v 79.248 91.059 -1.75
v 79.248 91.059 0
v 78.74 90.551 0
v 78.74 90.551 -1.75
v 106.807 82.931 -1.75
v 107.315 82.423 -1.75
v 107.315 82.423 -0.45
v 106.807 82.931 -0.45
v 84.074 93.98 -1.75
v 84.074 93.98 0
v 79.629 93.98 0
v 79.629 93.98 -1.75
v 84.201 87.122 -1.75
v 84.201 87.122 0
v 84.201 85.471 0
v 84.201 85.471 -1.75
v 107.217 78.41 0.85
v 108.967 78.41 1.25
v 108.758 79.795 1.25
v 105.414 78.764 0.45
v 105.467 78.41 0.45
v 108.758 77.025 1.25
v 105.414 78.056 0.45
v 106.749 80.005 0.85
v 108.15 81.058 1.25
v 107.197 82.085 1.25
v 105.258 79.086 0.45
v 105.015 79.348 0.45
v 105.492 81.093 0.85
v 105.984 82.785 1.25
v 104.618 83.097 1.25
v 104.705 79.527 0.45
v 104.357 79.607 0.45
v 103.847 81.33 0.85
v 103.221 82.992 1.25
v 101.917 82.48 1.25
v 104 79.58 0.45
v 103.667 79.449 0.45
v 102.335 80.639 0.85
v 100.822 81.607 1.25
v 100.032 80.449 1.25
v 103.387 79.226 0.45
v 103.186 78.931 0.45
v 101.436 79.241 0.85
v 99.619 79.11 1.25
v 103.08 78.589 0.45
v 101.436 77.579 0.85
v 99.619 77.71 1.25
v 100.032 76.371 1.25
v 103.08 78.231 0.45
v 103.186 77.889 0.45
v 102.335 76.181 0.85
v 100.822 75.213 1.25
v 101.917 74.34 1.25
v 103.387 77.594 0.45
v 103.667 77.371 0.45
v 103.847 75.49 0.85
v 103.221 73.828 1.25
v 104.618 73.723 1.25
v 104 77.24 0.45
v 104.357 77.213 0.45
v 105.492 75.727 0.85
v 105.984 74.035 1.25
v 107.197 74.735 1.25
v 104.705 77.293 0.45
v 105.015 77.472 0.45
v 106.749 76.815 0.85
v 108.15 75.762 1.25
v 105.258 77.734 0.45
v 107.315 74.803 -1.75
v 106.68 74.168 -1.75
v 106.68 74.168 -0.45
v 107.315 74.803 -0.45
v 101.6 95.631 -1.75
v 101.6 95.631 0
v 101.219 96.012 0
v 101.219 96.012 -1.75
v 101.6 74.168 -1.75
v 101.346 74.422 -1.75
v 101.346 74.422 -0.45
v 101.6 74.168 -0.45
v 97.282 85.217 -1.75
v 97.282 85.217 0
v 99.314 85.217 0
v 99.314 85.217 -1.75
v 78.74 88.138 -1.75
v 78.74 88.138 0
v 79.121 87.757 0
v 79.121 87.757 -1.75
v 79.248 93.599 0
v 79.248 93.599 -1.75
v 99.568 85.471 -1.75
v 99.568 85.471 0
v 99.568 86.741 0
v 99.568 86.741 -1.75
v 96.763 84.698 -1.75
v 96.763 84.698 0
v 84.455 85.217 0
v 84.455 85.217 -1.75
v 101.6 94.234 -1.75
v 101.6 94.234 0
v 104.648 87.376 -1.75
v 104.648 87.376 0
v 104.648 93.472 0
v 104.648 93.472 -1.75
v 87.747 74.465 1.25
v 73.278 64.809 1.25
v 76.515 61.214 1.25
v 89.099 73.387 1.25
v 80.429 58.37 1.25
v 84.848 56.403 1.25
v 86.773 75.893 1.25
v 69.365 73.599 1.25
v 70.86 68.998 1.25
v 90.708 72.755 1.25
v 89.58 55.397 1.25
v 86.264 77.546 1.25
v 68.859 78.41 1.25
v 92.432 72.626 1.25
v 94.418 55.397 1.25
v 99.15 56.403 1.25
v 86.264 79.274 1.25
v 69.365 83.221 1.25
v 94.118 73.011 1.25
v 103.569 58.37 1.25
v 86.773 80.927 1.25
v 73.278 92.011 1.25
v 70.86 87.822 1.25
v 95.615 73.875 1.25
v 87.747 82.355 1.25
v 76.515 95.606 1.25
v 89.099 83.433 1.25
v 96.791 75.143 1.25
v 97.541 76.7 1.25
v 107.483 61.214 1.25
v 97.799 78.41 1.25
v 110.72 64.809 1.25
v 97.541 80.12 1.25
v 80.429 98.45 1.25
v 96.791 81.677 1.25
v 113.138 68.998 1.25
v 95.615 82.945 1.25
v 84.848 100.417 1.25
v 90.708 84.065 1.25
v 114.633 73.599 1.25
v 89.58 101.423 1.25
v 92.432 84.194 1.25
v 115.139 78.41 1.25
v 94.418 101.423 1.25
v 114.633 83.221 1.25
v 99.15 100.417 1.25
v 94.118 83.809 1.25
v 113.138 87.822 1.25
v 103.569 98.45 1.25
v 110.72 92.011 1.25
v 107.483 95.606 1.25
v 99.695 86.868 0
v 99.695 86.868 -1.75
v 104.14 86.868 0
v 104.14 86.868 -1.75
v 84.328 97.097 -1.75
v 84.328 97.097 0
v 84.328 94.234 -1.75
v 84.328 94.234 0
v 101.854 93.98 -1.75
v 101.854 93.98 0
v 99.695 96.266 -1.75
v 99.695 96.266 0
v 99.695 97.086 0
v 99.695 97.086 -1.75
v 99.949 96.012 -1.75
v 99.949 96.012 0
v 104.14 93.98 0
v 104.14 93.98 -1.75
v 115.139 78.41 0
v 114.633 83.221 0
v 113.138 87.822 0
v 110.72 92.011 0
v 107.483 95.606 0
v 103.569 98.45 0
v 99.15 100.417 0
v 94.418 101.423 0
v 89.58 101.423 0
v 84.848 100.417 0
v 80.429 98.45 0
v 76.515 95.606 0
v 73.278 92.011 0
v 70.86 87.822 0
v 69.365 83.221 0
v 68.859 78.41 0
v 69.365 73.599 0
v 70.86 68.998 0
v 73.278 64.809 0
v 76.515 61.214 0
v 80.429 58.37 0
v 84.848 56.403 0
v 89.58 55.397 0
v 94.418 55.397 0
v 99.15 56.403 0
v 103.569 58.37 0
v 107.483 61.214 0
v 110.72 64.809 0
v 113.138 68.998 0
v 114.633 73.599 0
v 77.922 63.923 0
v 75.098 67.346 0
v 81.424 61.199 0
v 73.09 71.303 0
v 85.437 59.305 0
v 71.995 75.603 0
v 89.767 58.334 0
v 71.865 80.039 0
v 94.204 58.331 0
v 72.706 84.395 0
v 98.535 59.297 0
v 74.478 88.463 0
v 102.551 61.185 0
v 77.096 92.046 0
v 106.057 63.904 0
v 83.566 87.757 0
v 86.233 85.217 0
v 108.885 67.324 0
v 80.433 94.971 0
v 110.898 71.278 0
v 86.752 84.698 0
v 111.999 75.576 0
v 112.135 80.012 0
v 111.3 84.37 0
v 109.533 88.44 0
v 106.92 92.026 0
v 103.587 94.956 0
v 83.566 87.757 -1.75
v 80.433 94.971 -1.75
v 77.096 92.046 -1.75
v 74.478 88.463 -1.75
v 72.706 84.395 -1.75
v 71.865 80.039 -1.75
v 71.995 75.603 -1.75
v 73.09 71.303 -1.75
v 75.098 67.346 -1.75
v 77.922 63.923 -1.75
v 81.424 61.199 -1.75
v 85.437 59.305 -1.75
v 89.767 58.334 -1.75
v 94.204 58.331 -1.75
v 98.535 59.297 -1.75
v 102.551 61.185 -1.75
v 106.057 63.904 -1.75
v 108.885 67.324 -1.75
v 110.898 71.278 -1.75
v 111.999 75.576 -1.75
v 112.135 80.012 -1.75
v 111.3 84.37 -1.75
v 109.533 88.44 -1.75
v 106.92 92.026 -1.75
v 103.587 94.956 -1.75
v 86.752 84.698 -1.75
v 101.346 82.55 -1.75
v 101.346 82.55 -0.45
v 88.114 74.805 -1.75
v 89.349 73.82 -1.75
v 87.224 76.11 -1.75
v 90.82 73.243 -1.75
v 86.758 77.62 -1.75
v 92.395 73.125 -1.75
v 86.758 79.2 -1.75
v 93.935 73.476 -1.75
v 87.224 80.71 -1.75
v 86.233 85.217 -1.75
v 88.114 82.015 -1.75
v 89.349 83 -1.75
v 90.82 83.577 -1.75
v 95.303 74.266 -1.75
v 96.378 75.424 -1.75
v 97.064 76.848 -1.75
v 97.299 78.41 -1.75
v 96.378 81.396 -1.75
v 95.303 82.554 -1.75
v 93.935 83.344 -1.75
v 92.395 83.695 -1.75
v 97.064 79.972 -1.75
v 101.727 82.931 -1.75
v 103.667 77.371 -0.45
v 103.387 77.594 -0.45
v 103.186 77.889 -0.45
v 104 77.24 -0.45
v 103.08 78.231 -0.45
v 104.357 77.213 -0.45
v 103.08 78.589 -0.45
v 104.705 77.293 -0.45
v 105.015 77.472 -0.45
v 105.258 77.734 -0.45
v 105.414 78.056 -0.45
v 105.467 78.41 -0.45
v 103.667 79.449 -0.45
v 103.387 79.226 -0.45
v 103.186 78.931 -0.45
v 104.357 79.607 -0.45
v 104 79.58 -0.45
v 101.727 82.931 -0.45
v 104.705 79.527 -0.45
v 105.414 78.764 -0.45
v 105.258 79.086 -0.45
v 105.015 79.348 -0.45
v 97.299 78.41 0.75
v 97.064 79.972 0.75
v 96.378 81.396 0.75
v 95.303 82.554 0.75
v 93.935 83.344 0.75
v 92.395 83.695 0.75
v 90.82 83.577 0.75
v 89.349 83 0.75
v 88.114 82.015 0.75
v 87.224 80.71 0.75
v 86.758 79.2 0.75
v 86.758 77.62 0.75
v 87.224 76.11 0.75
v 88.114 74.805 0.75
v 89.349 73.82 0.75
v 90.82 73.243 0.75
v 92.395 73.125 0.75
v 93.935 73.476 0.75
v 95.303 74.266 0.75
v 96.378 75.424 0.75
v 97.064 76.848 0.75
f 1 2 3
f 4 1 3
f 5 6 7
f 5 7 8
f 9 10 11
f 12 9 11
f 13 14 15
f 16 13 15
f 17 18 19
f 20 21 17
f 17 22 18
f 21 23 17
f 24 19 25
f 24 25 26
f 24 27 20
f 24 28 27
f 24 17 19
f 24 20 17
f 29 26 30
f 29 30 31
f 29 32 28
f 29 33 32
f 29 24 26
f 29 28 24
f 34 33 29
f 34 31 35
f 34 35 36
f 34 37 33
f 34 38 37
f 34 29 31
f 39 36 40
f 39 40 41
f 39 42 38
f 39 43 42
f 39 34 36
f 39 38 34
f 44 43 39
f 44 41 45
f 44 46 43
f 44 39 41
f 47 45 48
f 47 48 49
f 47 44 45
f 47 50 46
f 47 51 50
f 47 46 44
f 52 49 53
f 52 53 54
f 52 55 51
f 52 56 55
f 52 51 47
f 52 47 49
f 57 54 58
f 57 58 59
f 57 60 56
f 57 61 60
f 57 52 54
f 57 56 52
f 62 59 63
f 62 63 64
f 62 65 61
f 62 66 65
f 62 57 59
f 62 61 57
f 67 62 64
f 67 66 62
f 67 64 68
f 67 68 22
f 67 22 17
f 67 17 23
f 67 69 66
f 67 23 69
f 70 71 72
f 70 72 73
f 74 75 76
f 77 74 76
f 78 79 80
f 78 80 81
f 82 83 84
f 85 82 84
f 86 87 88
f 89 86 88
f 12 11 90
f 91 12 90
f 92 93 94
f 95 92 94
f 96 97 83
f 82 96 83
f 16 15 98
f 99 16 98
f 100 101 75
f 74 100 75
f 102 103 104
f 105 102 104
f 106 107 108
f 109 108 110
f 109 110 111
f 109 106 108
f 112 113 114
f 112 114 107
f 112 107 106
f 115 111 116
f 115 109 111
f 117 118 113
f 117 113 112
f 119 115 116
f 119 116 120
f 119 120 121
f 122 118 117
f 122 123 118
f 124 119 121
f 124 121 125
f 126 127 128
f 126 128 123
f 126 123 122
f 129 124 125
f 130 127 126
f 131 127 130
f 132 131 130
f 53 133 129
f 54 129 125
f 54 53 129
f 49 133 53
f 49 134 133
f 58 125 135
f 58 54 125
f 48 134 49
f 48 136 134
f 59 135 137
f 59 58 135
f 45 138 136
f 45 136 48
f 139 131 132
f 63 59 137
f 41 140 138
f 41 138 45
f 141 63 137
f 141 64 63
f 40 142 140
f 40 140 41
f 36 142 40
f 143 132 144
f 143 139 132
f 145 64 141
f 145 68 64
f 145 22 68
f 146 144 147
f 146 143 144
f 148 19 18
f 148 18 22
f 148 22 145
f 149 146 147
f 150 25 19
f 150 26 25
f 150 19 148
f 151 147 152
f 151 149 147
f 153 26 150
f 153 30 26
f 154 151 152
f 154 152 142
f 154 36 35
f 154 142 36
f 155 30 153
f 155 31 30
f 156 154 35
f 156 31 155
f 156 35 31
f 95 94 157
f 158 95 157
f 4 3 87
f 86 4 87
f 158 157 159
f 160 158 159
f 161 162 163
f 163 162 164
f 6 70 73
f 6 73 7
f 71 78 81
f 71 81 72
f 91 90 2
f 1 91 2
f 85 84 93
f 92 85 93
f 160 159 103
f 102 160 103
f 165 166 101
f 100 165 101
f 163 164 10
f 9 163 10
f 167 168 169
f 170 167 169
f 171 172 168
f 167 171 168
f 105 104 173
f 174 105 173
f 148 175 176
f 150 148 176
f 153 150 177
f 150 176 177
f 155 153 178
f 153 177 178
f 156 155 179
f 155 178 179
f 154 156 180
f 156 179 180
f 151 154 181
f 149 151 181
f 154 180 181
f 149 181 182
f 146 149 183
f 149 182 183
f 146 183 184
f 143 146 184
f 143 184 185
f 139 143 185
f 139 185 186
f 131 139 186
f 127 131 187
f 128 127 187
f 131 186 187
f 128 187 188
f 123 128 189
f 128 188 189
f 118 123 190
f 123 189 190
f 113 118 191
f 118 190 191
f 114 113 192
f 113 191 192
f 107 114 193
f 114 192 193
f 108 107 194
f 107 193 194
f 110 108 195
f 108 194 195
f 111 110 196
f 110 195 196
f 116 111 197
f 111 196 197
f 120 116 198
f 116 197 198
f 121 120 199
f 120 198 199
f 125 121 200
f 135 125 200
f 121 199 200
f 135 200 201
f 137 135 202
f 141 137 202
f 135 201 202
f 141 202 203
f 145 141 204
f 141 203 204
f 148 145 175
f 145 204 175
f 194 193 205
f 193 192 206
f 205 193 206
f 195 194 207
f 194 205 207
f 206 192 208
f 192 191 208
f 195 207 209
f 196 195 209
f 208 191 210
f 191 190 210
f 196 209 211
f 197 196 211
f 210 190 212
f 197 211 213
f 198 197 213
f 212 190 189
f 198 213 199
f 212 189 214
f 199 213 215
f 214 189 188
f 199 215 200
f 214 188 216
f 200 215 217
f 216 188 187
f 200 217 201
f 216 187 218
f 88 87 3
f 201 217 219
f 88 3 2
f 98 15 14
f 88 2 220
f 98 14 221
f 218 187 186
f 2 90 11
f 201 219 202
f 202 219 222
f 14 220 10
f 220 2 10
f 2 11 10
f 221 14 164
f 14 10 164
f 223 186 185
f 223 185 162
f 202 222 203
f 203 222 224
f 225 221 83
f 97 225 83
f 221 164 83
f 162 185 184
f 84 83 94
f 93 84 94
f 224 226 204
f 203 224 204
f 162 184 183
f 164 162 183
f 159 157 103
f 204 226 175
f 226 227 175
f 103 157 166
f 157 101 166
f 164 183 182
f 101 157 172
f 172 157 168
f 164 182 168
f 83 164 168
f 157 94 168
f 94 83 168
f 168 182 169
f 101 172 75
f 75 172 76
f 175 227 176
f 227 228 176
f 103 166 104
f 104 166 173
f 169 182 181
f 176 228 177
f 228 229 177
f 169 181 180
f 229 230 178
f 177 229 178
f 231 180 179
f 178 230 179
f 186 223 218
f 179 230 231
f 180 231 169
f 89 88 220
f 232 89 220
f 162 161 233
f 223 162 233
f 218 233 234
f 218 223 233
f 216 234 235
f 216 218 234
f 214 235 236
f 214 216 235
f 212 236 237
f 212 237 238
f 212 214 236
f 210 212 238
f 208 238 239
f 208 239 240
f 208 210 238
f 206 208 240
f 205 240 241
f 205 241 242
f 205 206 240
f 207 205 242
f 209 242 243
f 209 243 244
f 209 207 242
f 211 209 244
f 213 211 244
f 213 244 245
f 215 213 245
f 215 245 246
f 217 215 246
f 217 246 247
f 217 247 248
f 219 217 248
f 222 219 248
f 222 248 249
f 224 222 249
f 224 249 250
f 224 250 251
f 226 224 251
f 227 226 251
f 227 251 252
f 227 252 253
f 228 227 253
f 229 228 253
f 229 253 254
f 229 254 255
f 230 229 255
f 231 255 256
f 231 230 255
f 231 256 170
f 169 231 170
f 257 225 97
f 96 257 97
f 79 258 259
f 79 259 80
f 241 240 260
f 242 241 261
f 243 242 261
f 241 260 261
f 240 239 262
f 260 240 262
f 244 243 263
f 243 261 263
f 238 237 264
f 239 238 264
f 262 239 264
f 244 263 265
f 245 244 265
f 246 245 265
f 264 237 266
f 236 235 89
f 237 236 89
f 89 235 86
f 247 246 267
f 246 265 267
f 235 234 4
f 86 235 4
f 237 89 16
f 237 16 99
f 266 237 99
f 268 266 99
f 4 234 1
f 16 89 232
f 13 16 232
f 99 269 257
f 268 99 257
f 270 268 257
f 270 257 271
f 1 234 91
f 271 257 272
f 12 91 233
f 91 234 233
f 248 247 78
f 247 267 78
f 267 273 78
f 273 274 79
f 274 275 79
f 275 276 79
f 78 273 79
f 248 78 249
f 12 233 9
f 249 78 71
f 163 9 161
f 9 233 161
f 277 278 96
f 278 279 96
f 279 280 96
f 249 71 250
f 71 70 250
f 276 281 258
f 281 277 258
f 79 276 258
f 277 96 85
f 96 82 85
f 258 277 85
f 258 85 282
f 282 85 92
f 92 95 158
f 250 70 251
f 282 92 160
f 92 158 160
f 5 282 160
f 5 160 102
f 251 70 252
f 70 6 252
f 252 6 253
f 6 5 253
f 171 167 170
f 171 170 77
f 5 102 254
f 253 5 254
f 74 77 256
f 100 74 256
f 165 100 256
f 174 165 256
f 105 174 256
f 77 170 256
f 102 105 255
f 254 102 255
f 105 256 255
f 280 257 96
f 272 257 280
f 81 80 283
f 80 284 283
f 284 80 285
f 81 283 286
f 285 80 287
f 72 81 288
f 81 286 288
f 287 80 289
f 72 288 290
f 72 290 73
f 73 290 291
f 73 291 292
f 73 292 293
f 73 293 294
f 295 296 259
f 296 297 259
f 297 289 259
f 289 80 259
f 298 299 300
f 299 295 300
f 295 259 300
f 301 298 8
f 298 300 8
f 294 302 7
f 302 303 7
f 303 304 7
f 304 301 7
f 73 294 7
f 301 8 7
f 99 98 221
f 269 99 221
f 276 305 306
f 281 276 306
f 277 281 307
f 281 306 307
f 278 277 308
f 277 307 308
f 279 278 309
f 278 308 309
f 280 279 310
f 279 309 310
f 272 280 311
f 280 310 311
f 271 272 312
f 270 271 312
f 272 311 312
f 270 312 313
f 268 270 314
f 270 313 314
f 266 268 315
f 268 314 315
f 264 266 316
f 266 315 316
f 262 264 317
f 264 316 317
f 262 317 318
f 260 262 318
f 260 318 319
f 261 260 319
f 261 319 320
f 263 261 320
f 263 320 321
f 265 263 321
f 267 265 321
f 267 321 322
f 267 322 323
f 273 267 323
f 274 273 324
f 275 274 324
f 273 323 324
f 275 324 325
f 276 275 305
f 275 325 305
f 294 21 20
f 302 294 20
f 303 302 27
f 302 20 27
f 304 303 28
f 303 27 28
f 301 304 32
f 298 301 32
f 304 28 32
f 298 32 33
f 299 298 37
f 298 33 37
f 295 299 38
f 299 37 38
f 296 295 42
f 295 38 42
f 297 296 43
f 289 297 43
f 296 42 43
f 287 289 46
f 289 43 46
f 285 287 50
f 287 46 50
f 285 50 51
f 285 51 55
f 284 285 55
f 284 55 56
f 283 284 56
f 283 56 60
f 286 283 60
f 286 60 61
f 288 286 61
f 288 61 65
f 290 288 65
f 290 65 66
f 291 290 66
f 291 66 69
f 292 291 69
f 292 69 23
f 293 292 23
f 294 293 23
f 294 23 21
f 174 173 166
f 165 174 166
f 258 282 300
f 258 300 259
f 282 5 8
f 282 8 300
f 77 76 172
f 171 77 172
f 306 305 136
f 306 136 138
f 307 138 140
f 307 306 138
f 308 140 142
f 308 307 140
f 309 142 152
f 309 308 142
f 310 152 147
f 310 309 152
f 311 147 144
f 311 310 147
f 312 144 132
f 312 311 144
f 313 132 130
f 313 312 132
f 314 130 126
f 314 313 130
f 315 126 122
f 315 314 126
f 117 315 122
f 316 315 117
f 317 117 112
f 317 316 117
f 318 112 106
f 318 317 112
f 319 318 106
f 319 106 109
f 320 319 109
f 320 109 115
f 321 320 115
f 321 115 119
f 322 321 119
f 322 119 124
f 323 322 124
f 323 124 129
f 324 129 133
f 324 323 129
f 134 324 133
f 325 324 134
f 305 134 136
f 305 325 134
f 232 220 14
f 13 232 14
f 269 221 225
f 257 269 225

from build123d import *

# Parameters (mm, degrees)
SKETCH_1_R          = 23.14
EXTRUDE_1_DEPTH     = 1.25
SKETCH_2_R          = 20.2
EXTRUDE_2_DEPTH     = 1.75
CUT_EXTRUDE_1_DEPTH = 1.75
CUT_EXTRUDE_START   = 1.25
SKETCH_5_R          = 1.20000014
SKETCH_5_R_2        = 5.3
CUT_EXTRUDE_2_DEPTH = 3
CHAMFER_1_SIZE      = 3.5
CHAMFER_1_SIZE2     = 0.8
CHAMFER_2_SIZE      = 0.5
CUT_EXTRUDE_START_2 = -1.75
CUT_EXTRUDE_3_DEPTH = 1.3


with BuildPart() as part:
    # 草图1 → 凸台-拉伸1 (new body)
    with BuildSketch(Plane.XY):
        with Locations((91.99900066, 78.41000066)):
            Circle(SKETCH_1_R)
    extrude(amount=EXTRUDE_1_DEPTH)

    # 草图2 → 凸台-拉伸2 (add)
    with BuildSketch(Plane.XY):
        with Locations((91.99900066, 78.41000066)):
            Circle(SKETCH_2_R)
    extrude(amount=-EXTRUDE_2_DEPTH)

    # 草图3 → 切除-拉伸1 (cut)
    with BuildSketch(Plane.XY):
        with BuildLine():
            Line((99.695, 96.266), (99.695, 97.658416258))
            ThreePointArc((99.695, 97.658416258), (92.012378583, 99.139588259), (84.327969421, 97.66771932))
            Line((84.327969421, 97.66771932), (84.327969421, 94.233969421))
            Line((84.327969421, 94.233969421), (84.074, 93.98))
            Line((84.074, 93.98), (79.629, 93.98))
            Line((79.629, 93.98), (79.248, 93.599))
            Line((79.248, 93.599), (79.248, 91.059))
            Line((79.248, 91.059), (78.74, 90.551))
            Line((78.74, 90.551), (78.74, 88.138))
            Line((78.74, 88.138), (79.121, 87.757))
            Line((79.121, 87.757), (83.566, 87.757))
            Line((83.566, 87.757), (84.201, 87.122))
            Line((84.201, 87.122), (84.201, 85.471))
            Line((84.201, 85.471), (84.455, 85.217))
            Line((84.455, 85.217), (86.233, 85.217))
            Line((86.233, 85.217), (86.752296117, 84.697830406))
            Line((86.752296117, 84.697830406), (96.762680157, 84.697680157))
            Line((96.762680157, 84.697680157), (97.282, 85.217))
            Line((97.282, 85.217), (99.314, 85.217))
            Line((99.314, 85.217), (99.568, 85.471))
            Line((99.568, 85.471), (99.568, 85.725))
            Line((99.568, 85.725), (99.568, 86.741))
            Line((99.568, 86.741), (99.695, 86.868))
            Line((99.695, 86.868), (104.14, 86.868))
            Line((104.14, 86.868), (104.648, 87.376))
            Line((104.648, 87.376), (104.648, 93.472))
            Line((104.648, 93.472), (104.14, 93.98))
            Line((104.14, 93.98), (101.854, 93.98))
            Line((101.854, 93.98), (101.6, 94.234))
            Line((101.6, 94.234), (101.6, 95.631))
            Line((101.6, 95.631), (101.219, 96.012))
            Line((101.219, 96.012), (99.949, 96.012))
            Line((99.949, 96.012), (99.695, 96.266))
        make_face()
    extrude(amount=-CUT_EXTRUDE_1_DEPTH, mode=Mode.SUBTRACT)

    # 草图5 → 切除-拉伸2 (cut)
    with BuildSketch(Plane.XY.offset(CUT_EXTRUDE_START)):
        with Locations((104.267, 78.41000066)):
            Circle(SKETCH_5_R)
        with Locations((91.99900066, 78.41000066)):
            Circle(SKETCH_5_R_2)
    extrude(amount=-CUT_EXTRUDE_2_DEPTH, mode=Mode.SUBTRACT)

    # 倒角1
    chamfer_1_edges = [part.edges().sort_by_distance(p)[0] for p in [
        (103.06699986, 78.41000066, 1.25),
    ]]
    chamfer_1_side = [part.faces().sort_by_distance(p)[0] for p in [
        (69.513498697, 78.41000066, 1.25),
    ]]
    chamfer(chamfer_1_edges, length=CHAMFER_1_SIZE, length2=CHAMFER_1_SIZE2, reference=chamfer_1_side[0])

    # 倒角2
    chamfer_2_edges = [part.edges().sort_by_distance(p)[0] for p in [
        (86.69900066, 78.41000066, 1.25),
    ]]
    chamfer(chamfer_2_edges, length=CHAMFER_2_SIZE)

    # 草图6 → 切除-拉伸3 (cut)
    with BuildSketch(Plane.XY.offset(CUT_EXTRUDE_START_2)):
        Polygon((101.727, 82.931), (101.346, 82.55), (101.346, 74.422), (101.6, 74.168), (106.68, 74.168), (107.315, 74.803), (107.315, 82.423), (106.807, 82.931), align=None)
    extrude(amount=CUT_EXTRUDE_3_DEPTH, mode=Mode.SUBTRACT)


solid = part.part
